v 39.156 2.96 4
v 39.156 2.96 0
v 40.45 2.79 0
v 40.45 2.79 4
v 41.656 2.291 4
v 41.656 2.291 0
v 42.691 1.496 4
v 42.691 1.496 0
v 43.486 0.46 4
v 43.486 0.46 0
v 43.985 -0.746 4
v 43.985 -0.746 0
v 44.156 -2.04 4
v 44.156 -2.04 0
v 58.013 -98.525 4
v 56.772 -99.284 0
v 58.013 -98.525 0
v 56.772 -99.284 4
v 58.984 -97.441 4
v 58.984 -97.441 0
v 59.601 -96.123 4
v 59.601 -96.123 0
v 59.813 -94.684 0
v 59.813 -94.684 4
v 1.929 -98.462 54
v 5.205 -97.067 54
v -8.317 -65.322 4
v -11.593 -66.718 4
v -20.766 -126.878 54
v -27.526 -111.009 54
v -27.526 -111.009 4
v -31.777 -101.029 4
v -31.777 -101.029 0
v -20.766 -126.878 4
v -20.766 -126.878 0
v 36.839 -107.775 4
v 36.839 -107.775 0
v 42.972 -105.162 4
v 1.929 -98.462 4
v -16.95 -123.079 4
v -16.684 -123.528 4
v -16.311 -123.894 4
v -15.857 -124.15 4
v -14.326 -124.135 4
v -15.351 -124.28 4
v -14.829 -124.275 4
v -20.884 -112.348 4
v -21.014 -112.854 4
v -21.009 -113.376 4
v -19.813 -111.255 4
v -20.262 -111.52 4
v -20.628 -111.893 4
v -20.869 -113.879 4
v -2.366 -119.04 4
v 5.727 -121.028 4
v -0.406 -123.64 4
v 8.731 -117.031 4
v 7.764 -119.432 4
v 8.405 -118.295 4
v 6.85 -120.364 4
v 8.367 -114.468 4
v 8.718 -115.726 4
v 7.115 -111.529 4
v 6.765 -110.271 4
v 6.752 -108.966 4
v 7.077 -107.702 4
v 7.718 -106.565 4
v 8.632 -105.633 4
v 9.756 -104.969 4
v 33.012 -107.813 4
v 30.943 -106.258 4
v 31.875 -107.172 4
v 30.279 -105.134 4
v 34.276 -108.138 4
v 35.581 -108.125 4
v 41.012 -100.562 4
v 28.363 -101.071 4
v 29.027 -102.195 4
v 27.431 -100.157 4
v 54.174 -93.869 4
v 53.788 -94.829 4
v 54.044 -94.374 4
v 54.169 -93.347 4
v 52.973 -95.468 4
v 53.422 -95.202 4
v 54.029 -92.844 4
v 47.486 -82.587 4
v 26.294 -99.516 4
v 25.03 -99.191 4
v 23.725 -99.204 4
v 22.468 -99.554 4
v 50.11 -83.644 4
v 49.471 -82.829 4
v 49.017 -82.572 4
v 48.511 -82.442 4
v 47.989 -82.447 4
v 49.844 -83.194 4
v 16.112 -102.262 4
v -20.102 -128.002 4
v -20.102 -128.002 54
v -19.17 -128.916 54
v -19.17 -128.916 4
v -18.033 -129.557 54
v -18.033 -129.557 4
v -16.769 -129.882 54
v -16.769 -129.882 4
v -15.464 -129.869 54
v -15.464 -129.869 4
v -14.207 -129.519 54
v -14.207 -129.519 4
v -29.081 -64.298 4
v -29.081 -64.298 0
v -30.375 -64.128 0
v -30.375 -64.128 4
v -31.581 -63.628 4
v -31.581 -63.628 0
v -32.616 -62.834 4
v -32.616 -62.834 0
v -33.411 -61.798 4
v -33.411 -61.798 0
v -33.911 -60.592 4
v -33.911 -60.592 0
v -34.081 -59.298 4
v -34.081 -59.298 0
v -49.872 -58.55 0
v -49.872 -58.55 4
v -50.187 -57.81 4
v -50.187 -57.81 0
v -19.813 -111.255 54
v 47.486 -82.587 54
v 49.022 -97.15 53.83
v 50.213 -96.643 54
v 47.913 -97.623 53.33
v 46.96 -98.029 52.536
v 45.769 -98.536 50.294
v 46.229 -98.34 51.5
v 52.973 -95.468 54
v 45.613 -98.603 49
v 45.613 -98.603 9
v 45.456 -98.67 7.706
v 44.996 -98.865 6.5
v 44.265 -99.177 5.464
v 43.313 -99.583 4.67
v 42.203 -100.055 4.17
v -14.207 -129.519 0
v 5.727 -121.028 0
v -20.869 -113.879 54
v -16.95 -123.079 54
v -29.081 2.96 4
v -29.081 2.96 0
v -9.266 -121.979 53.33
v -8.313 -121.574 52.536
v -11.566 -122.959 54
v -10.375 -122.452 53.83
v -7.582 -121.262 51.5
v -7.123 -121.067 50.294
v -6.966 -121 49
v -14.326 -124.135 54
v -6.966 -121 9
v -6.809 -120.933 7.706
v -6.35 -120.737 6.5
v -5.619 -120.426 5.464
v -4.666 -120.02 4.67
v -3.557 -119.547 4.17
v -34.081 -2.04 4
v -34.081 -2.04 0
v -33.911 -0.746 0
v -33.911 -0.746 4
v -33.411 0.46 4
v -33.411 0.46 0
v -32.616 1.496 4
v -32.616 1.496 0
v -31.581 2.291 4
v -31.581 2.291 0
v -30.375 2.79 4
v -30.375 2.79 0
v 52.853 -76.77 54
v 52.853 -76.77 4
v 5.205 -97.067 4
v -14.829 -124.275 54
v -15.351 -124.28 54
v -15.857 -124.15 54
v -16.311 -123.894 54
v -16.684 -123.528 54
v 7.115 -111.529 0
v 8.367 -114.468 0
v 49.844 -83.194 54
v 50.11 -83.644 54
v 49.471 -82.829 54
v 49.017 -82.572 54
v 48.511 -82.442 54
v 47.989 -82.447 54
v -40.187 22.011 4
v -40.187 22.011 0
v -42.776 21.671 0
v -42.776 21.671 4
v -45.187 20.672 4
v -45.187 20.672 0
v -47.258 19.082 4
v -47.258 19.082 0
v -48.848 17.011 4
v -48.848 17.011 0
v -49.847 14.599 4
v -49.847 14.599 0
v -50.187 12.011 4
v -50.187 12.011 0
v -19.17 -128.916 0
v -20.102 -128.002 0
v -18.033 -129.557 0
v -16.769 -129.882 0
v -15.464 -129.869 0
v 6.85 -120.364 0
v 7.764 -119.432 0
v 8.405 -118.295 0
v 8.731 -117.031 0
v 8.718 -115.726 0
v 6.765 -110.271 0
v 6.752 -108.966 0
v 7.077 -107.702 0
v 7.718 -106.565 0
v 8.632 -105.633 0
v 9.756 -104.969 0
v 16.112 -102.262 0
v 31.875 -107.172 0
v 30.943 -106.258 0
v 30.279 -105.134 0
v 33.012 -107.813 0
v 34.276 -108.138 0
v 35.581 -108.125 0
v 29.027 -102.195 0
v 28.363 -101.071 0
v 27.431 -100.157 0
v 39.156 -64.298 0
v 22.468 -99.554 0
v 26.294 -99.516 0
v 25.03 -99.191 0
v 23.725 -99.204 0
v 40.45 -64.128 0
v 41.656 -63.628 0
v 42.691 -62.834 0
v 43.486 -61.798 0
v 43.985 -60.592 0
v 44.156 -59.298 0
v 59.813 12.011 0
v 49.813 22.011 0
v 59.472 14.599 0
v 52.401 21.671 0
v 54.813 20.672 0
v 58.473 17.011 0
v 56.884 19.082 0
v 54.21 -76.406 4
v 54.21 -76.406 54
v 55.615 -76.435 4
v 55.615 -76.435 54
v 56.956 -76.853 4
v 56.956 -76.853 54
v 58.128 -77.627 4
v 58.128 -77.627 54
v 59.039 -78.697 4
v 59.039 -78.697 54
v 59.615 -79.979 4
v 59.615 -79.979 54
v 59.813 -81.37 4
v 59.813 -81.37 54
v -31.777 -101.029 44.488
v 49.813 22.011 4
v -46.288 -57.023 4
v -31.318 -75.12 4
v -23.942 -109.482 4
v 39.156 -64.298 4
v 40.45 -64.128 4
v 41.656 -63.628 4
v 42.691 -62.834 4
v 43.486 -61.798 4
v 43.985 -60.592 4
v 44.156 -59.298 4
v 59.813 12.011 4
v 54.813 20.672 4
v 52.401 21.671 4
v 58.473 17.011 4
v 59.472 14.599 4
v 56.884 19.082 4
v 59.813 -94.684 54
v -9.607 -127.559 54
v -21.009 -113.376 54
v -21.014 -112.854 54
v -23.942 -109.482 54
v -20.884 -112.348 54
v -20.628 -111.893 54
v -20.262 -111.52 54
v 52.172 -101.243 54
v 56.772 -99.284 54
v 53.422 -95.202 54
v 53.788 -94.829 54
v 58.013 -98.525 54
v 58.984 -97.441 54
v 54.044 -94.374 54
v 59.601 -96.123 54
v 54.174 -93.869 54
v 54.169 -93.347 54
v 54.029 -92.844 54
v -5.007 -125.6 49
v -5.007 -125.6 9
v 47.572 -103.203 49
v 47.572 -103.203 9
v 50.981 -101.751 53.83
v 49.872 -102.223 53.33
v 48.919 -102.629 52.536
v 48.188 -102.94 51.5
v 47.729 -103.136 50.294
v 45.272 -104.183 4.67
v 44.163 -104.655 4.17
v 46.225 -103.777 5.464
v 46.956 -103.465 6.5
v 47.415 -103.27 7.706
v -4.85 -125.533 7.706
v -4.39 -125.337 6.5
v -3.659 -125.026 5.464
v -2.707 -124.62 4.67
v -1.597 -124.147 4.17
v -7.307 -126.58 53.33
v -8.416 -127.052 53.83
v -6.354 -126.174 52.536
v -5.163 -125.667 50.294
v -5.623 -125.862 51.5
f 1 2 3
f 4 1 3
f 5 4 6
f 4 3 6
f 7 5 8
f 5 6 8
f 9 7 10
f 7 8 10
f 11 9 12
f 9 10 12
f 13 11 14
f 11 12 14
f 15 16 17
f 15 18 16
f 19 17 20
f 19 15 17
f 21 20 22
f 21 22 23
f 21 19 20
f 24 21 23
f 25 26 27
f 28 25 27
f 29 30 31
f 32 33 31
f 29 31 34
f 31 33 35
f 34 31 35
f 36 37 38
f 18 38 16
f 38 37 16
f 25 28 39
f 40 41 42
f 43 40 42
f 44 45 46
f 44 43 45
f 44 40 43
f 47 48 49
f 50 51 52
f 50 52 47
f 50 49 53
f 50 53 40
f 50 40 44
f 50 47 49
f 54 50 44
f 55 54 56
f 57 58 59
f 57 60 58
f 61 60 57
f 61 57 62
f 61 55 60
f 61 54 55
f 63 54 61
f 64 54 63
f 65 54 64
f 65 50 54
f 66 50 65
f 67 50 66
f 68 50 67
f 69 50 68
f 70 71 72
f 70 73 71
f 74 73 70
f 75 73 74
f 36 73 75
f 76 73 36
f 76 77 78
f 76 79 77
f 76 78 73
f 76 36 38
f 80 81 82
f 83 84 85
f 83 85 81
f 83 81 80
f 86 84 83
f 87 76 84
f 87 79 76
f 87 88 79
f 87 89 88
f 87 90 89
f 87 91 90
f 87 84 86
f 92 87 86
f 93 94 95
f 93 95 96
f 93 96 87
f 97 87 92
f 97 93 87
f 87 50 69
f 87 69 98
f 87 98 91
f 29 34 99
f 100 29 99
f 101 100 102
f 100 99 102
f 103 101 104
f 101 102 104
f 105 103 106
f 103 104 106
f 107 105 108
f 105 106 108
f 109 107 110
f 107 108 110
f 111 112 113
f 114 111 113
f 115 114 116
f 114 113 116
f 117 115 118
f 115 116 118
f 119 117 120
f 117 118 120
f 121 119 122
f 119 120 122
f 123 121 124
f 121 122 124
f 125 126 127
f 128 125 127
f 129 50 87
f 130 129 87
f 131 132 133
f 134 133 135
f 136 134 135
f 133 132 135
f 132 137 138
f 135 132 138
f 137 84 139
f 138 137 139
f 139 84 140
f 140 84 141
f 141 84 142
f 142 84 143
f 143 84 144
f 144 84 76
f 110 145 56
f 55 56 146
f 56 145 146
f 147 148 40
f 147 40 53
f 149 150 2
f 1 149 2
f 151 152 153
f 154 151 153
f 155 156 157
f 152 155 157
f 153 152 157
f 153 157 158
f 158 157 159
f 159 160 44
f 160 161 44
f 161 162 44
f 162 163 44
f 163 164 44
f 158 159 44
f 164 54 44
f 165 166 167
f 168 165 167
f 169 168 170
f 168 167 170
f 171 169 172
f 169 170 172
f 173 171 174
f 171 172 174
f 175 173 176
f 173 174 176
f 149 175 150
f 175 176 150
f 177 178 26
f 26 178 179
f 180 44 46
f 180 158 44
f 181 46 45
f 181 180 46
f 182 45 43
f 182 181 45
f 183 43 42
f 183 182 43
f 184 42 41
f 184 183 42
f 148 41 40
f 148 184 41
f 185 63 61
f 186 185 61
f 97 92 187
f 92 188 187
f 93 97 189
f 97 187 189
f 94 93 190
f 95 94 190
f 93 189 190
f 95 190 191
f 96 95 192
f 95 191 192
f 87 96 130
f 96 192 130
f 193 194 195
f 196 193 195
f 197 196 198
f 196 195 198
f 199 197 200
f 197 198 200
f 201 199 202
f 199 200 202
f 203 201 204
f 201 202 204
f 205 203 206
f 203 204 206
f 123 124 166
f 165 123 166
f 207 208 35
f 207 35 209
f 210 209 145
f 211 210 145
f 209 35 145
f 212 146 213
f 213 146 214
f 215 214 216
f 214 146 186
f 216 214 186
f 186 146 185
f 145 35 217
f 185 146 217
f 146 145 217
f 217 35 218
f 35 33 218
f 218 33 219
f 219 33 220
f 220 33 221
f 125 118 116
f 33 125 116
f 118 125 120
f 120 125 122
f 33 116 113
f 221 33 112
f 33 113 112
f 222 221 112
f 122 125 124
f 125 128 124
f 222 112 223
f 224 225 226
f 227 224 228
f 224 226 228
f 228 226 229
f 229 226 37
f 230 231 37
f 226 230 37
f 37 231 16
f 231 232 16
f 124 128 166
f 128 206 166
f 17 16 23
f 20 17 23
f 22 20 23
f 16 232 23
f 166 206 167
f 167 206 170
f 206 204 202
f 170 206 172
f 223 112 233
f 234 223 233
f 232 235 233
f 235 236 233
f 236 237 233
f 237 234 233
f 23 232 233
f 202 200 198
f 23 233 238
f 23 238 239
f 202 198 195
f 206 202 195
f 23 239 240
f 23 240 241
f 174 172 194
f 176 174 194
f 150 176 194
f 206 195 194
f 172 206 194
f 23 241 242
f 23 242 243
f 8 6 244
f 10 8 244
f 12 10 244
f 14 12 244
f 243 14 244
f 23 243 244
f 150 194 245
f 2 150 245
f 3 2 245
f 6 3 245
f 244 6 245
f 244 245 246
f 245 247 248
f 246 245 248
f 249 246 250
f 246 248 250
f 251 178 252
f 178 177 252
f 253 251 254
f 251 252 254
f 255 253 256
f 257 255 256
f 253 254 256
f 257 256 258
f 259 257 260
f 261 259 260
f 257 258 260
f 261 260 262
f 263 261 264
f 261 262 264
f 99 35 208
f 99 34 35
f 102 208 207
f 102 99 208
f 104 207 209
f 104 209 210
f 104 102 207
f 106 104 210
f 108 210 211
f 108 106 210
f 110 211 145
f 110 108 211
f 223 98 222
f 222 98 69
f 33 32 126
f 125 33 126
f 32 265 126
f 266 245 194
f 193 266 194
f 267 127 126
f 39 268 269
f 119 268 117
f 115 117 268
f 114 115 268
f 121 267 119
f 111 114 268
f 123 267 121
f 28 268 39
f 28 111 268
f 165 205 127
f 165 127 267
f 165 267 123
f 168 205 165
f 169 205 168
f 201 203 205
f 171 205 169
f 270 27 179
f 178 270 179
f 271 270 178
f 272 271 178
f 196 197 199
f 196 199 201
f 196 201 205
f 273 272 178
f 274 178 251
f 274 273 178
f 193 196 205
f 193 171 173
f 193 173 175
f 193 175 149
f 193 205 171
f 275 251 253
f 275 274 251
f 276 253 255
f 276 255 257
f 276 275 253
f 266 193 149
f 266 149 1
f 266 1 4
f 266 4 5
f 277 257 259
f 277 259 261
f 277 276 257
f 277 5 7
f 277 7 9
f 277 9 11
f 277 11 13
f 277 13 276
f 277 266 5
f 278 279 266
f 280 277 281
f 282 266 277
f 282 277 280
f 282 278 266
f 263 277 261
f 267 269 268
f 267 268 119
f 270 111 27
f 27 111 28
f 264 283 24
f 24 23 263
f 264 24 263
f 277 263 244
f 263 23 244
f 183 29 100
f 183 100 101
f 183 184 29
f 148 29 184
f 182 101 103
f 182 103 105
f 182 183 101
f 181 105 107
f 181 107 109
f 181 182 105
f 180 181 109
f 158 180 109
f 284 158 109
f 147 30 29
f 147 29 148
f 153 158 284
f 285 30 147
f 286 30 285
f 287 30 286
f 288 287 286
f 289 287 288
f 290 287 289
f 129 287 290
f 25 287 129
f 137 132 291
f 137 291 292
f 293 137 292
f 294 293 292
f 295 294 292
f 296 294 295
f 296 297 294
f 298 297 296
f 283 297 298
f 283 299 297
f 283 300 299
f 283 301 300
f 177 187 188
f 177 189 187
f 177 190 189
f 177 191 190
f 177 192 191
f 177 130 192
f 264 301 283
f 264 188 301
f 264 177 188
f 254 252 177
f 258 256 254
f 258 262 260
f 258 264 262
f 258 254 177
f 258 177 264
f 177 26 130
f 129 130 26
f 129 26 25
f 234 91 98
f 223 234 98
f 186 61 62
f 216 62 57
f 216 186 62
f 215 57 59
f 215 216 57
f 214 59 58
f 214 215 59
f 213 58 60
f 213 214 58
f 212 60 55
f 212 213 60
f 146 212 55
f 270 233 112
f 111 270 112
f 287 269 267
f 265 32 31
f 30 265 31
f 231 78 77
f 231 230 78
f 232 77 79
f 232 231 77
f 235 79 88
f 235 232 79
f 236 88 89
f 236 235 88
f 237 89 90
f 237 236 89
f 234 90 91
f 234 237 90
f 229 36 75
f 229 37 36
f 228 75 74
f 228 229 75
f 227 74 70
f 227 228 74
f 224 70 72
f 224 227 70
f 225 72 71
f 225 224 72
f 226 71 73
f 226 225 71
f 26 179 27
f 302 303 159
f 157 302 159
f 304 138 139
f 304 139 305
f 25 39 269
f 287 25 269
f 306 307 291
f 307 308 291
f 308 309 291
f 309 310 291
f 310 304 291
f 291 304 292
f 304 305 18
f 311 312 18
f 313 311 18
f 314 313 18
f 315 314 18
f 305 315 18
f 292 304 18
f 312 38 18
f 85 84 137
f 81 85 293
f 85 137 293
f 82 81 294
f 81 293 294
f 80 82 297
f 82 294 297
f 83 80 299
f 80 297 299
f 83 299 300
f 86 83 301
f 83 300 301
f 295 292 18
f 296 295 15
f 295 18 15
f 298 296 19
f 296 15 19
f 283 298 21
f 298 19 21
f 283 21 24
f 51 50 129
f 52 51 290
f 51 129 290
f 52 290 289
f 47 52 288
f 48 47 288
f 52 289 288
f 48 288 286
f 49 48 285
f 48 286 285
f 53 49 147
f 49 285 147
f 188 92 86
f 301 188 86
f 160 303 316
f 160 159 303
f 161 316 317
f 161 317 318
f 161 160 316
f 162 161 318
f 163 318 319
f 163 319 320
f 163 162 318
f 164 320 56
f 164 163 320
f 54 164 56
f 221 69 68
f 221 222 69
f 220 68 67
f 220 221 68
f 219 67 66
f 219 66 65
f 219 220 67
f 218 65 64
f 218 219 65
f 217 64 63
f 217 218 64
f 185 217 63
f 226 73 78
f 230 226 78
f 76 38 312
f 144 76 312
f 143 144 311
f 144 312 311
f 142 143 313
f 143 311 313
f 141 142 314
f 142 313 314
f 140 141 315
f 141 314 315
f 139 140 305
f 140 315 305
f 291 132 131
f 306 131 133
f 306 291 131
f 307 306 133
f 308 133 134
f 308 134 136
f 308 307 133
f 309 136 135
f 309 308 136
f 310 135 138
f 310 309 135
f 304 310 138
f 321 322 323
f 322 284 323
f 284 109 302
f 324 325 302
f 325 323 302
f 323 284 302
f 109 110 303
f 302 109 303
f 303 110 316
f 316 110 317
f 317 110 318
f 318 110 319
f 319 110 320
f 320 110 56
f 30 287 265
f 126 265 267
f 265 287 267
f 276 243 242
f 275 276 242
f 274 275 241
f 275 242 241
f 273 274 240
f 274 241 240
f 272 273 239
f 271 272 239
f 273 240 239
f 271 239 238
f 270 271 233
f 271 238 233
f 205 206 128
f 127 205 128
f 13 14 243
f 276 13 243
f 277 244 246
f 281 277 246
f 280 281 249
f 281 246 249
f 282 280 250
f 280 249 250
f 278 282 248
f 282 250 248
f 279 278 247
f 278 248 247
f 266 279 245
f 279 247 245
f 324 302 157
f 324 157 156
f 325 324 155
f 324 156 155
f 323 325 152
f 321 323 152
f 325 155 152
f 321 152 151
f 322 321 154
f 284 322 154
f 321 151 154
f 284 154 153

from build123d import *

# Parameters (mm, degrees)
F1_DEPTH  = 4
F2_R      = 5
F4_DEPTH  = 50
F6_DEPTH  = 25
F7_R      = 5
F8_R      = 2
F10_DEPTH = 25
F12_DEPTH = 25
F14_DEPTH = 25
F15_R     = 5


with BuildPart() as f1:
    # F0 (on Top) → F1 (new body)
    with BuildSketch(Plane.XY):
        with BuildLine():
            Line((49.8126317561, 22.0112954478), (-40.1873682439, 22.0112954478))
            ThreePointArc((-40.1873682439, 22.0112954478), (-47.2584360558, 19.0823632597), (-50.1873682439, 12.0112954478))
            Line((-50.1873682439, 12.0112954478), (-50.1873682439, -97.9887045522))
            Line((-50.1873682439, -97.9887045522), (-33.0722484738, -97.9887045522))
            Line((-33.0722484738, -97.9887045522), (59.8126317561, -97.9887045522))
            Line((59.8126317561, -97.9887045522), (59.8126317561, 12.0112954478))
            ThreePointArc((59.8126317561, 12.0112954478), (56.8836995679, 19.0823632597), (49.8126317561, 22.0112954478))
        make_face()
        with BuildLine():
            Line((-34.0809039772, -59.2981277779), (-34.0809039772, -2.0396176167))
            ThreePointArc((-34.0809039772, -2.0396176167), (-32.6164378831, 1.4959162892), (-29.0809039772, 2.9603823833))
            Line((-29.0809039772, 2.9603823833), (39.1555567086, 2.9603823833))
            ThreePointArc((39.1555567086, 2.9603823833), (42.6910906145, 1.4959162892), (44.1555567086, -2.0396176167))
            Line((44.1555567086, -2.0396176167), (44.1555567086, -59.2981277779))
            ThreePointArc((44.1555567086, -59.2981277779), (42.6910906145, -62.8336616838), (39.1555567086, -64.2981277779))
            Line((39.1555567086, -64.2981277779), (-29.0809039772, -64.2981277779))
            ThreePointArc((-29.0809039772, -64.2981277779), (-32.6164378831, -62.8336616838), (-34.0809039772, -59.2981277779))
        make_face(mode=Mode.SUBTRACT)
        Polygon((-18.8066744284, -131.4782482004), (59.8126317561, -97.9887045522), (-33.0722484738, -97.9887045522), align=None)
    extrude(amount=F1_DEPTH)

    # F2
    f2_edges = [f1.edges().sort_by_distance(p)[0] for p in [
        (-33.072248, -97.988705, 2),
        (-50.187368, -97.988705, 2),
        (59.812632, -97.988705, 2),
        (-18.806674, -131.478248, 2),
    ]]
    fillet(f2_edges, radius=F2_R)

    # F3 (on face) → F4 (join)
    with BuildSketch(Plane.XY.offset(4)):
        with BuildLine():
            Line((-6.9660247439, -120.9997456811), (-16.1661150585, -124.9187172558))
            Line((-16.1661150585, -124.9187172558), (-21.6526752631, -112.0385908154))
            Line((-21.6526752631, -112.0385908154), (49.3260715515, -81.8037038021))
            Line((49.3260715515, -81.8037038021), (54.8126317561, -94.6838302426))
            Line((54.8126317561, -94.6838302426), (45.6125414415, -98.6028018173))
            Line((45.6125414415, -98.6028018173), (47.5720272288, -103.2028469746))
            Line((47.5720272288, -103.2028469746), (56.7721175434, -99.2838753999))
            ThreePointArc((56.7721175434, -99.2838753999), (58.9838083848, -97.4408731388), (59.8126317561, -94.6838302426))
            Line((59.8126317561, -94.6838302426), (59.8126317561, -73.8051433371))
            Line((59.8126317561, -73.8051433371), (5.2046610063, -97.0665546714))
            Line((5.2046610063, -97.0665546714), (1.9289534576, -98.4619110571))
            Line((1.9289534576, -98.4619110571), (-23.9415310778, -109.4819869532))
            Line((-23.9415310778, -109.4819869532), (-27.5260314097, -111.0088801064))
            Line((-27.5260314097, -111.0088801064), (-20.7661602158, -126.8782030431))
            ThreePointArc((-20.7661602158, -126.8782030431), (-18.0332724951, -129.5570060682), (-14.2066292711, -129.5187624131))
            Line((-14.2066292711, -129.5187624131), (-5.0065389565, -125.5997908384))
            Line((-5.0065389565, -125.5997908384), (-6.9660247439, -120.9997456811))
        make_face()
        Polygon((-31.7770776261, -101.0292187648), (-27.5260314097, -111.0088801064), (-23.9415310778, -109.4819869532), (-46.2875531446, -57.0229636434), (-49.8720534765, -58.5498567966), align=None)
        Polygon((1.9289534576, -98.4619110571), (5.2046610063, -97.0665546714), (-8.3174404532, -65.3223706937), (-11.5931480018, -66.7177270794), align=None)
    extrude(amount=F4_DEPTH)

    # F5 (on face) → F6 (cut)
    with BuildSketch(Plane.XY.offset(4)):
        Polygon((10.3267065007, -119.0682730989), (21.2827441361, -114.4013189065), (16.1116256489, -102.2617164104), (5.1555880134, -106.9286706028), align=None)
        Polygon((16.1116256489, -102.2617164104), (21.2827441361, -114.4013189065), (32.2387817716, -109.734364714), (27.0676632843, -97.5947622179), align=None)
    extrude(amount=-F6_DEPTH, mode=Mode.SUBTRACT)

    # F7
    f7_edges = [f1.edges().sort_by_distance(p)[0] for p in [
        (-5.986282, -123.299768, 54),
        (46.592284, -100.902824, 54),
        (46.592284, -100.902824, 4),
        (-5.986282, -123.299768, 4),
        (32.238782, -109.734365, 2),
        (10.326707, -119.068273, 2),
        (27.067663, -97.594762, 2),
        (5.155588, -106.928671, 2),
    ]]
    fillet(f7_edges, radius=F7_R)

    # F8
    f8_edges = [f1.edges().sort_by_distance(p)[0] for p in [
        (49.326072, -81.803704, 29),
        (54.812632, -94.68383, 29),
        (-21.652675, -112.038591, 29),
        (-16.166115, -124.918717, 29),
    ]]
    fillet(f8_edges, radius=F8_R)

    # F9 (on face) → F10 (cut)
    with BuildSketch(Plane(origin=(-59.7381223873, -25.4467071035, 0), x_dir=(-0.3918971575, 0.9200090315, 0), z_dir=(0.9200090315, 0.3918971575, 0))):
        Polygon((-34.321681049, 54), (-91.3417988043, 54), (-34.321681049, 4), align=None)
    extrude(amount=-F10_DEPTH, mode=Mode.SUBTRACT)

    # F11 (on face) → F12 (cut)
    with BuildSketch(Plane.XY.offset(4)):
        with BuildLine():
            ThreePointArc((-36.3771227834, -97.9887045522), (-33.6200798872, -98.8175279234), (-31.7770776261, -101.0292187648))
            Line((-31.7770776261, -101.0292187648), (-49.8720534765, -58.5498567966))
            Line((-49.8720534765, -58.5498567966), (-50.1873682439, -57.809630877))
            Line((-50.1873682439, -57.809630877), (-50.1873682439, -92.9887045522))
            ThreePointArc((-50.1873682439, -92.9887045522), (-48.7229021499, -96.5242384581), (-45.1873682439, -97.9887045522))
            Line((-45.1873682439, -97.9887045522), (-36.3771227834, -97.9887045522))
        make_face()
    extrude(amount=-F12_DEPTH, mode=Mode.SUBTRACT)

    # F13 (on face) → F14 (cut)
    with BuildSketch(Plane(origin=(-30.5919303032, -13.0312748216, 0), x_dir=(-0.3918971575, 0.9200090315, 0), z_dir=(0.9200090315, 0.3918971575, 0))):
        Polygon((-56.8375897235, 54), (-91.3417988043, 54), (-56.8375897235, 4), align=None)
    extrude(amount=-F14_DEPTH, mode=Mode.SUBTRACT)

    # F15
    f15_edges = [f1.edges().sort_by_distance(p)[0] for p in [
        (59.812632, -73.805143, 29),
    ]]
    fillet(f15_edges, radius=F15_R)


solid = f1.part
